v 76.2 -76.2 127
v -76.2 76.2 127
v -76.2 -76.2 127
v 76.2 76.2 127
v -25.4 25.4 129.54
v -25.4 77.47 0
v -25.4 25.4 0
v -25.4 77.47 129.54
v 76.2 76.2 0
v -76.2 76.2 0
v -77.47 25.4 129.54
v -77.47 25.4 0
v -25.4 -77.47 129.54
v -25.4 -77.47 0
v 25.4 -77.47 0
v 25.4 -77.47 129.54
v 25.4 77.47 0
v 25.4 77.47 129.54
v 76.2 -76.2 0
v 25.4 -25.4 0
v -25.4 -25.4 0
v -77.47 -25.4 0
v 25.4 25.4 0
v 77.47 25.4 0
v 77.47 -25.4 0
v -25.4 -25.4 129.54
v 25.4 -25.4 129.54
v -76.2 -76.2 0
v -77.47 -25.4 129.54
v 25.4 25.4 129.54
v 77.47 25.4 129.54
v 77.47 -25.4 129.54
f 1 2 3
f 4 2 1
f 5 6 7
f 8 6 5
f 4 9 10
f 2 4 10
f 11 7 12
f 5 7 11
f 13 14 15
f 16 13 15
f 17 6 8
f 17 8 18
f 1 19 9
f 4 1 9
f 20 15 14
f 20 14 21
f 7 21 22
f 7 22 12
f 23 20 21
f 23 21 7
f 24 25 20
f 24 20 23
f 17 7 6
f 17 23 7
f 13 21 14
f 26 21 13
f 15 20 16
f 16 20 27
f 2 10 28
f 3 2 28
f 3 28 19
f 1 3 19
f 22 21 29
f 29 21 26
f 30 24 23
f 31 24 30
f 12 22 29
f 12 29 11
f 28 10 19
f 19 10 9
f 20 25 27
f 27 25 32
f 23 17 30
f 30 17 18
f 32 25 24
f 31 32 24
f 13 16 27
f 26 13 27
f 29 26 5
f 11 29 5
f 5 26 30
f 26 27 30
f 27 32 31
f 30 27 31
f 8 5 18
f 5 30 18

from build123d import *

# Parameters (mm, degrees)
F0_W     = 50.8
F0_H     = 1.27
F1_DEPTH = 127
F0_W_2   = 1.27
F0_H_2   = 50.8
F2_DEPTH = 129.54
F3_DEPTH = 152.4
F4_DEPTH = 152.4


with BuildPart() as f1:
    # F0 (on Top) → F1 (new body)
    with BuildSketch(Plane.XY):
        Polygon((-25.4, 76.2), (-76.2, 76.2), (-76.2, 25.4), (-76.2, -25.4), (-76.2, -76.2), (-25.4, -76.2), (25.4, -76.2), (76.2, -76.2), (76.2, -25.4), (76.2, 25.4), (76.2, 76.2), (25.4, 76.2), (25.4, 74.93), (-25.4, 74.93), align=None)
        with Locations((0, 75.565)):
            Rectangle(F0_W, F0_H)
    extrude(amount=F1_DEPTH)


with BuildPart() as f2:
    # F0 (on Top) → F2 (new body)
    with BuildSketch(Plane.XY):
        with Locations((76.835, 0)):
            Rectangle(F0_W_2, F0_H_2)
    extrude(amount=F2_DEPTH)

    # F4 (add): a face of the model
    f4_faces = [f2.faces().sort_by_distance(p)[0] for p in [
        (76.2, 0, 64.77),
    ]]


with BuildPart() as f2b:
    # F0 (on Top) → F2, piece 2 (new body)
    with BuildSketch(Plane.XY):
        with Locations((0, 76.835)):
            Rectangle(F0_W, F0_H)
    extrude(amount=F2_DEPTH)

    # F3 (add): a face of the model
    f3_faces = [f2b.faces().sort_by_distance(p)[0] for p in [
        (0, 76.2, 64.77),
    ]]


with BuildPart() as f2c:
    # F0 (on Top) → F2, piece 3 (new body)
    with BuildSketch(Plane.XY):
        with Locations((0, -76.835)):
            Rectangle(F0_W, F0_H)
    extrude(amount=F2_DEPTH)


with BuildPart() as f2d:
    # F0 (on Top) → F2, piece 4 (new body)
    with BuildSketch(Plane.XY):
        with Locations((-76.835, 0)):
            Rectangle(F0_W_2, F0_H_2)
    extrude(amount=F2_DEPTH)


with BuildPart() as f2b_1:
    add(f2b.part)

    add(f2c.part)  # F3 merges F2c
    extrude(f3_faces, amount=F3_DEPTH)


with BuildPart() as f2_1:
    add(f2.part)

    add(f2b_1.part)  # F4 merges F2b

    add(f2d.part)  # F4 merges F2d
    extrude(f4_faces, amount=F4_DEPTH)


solid = Compound([f1.part, f2_1.part])
